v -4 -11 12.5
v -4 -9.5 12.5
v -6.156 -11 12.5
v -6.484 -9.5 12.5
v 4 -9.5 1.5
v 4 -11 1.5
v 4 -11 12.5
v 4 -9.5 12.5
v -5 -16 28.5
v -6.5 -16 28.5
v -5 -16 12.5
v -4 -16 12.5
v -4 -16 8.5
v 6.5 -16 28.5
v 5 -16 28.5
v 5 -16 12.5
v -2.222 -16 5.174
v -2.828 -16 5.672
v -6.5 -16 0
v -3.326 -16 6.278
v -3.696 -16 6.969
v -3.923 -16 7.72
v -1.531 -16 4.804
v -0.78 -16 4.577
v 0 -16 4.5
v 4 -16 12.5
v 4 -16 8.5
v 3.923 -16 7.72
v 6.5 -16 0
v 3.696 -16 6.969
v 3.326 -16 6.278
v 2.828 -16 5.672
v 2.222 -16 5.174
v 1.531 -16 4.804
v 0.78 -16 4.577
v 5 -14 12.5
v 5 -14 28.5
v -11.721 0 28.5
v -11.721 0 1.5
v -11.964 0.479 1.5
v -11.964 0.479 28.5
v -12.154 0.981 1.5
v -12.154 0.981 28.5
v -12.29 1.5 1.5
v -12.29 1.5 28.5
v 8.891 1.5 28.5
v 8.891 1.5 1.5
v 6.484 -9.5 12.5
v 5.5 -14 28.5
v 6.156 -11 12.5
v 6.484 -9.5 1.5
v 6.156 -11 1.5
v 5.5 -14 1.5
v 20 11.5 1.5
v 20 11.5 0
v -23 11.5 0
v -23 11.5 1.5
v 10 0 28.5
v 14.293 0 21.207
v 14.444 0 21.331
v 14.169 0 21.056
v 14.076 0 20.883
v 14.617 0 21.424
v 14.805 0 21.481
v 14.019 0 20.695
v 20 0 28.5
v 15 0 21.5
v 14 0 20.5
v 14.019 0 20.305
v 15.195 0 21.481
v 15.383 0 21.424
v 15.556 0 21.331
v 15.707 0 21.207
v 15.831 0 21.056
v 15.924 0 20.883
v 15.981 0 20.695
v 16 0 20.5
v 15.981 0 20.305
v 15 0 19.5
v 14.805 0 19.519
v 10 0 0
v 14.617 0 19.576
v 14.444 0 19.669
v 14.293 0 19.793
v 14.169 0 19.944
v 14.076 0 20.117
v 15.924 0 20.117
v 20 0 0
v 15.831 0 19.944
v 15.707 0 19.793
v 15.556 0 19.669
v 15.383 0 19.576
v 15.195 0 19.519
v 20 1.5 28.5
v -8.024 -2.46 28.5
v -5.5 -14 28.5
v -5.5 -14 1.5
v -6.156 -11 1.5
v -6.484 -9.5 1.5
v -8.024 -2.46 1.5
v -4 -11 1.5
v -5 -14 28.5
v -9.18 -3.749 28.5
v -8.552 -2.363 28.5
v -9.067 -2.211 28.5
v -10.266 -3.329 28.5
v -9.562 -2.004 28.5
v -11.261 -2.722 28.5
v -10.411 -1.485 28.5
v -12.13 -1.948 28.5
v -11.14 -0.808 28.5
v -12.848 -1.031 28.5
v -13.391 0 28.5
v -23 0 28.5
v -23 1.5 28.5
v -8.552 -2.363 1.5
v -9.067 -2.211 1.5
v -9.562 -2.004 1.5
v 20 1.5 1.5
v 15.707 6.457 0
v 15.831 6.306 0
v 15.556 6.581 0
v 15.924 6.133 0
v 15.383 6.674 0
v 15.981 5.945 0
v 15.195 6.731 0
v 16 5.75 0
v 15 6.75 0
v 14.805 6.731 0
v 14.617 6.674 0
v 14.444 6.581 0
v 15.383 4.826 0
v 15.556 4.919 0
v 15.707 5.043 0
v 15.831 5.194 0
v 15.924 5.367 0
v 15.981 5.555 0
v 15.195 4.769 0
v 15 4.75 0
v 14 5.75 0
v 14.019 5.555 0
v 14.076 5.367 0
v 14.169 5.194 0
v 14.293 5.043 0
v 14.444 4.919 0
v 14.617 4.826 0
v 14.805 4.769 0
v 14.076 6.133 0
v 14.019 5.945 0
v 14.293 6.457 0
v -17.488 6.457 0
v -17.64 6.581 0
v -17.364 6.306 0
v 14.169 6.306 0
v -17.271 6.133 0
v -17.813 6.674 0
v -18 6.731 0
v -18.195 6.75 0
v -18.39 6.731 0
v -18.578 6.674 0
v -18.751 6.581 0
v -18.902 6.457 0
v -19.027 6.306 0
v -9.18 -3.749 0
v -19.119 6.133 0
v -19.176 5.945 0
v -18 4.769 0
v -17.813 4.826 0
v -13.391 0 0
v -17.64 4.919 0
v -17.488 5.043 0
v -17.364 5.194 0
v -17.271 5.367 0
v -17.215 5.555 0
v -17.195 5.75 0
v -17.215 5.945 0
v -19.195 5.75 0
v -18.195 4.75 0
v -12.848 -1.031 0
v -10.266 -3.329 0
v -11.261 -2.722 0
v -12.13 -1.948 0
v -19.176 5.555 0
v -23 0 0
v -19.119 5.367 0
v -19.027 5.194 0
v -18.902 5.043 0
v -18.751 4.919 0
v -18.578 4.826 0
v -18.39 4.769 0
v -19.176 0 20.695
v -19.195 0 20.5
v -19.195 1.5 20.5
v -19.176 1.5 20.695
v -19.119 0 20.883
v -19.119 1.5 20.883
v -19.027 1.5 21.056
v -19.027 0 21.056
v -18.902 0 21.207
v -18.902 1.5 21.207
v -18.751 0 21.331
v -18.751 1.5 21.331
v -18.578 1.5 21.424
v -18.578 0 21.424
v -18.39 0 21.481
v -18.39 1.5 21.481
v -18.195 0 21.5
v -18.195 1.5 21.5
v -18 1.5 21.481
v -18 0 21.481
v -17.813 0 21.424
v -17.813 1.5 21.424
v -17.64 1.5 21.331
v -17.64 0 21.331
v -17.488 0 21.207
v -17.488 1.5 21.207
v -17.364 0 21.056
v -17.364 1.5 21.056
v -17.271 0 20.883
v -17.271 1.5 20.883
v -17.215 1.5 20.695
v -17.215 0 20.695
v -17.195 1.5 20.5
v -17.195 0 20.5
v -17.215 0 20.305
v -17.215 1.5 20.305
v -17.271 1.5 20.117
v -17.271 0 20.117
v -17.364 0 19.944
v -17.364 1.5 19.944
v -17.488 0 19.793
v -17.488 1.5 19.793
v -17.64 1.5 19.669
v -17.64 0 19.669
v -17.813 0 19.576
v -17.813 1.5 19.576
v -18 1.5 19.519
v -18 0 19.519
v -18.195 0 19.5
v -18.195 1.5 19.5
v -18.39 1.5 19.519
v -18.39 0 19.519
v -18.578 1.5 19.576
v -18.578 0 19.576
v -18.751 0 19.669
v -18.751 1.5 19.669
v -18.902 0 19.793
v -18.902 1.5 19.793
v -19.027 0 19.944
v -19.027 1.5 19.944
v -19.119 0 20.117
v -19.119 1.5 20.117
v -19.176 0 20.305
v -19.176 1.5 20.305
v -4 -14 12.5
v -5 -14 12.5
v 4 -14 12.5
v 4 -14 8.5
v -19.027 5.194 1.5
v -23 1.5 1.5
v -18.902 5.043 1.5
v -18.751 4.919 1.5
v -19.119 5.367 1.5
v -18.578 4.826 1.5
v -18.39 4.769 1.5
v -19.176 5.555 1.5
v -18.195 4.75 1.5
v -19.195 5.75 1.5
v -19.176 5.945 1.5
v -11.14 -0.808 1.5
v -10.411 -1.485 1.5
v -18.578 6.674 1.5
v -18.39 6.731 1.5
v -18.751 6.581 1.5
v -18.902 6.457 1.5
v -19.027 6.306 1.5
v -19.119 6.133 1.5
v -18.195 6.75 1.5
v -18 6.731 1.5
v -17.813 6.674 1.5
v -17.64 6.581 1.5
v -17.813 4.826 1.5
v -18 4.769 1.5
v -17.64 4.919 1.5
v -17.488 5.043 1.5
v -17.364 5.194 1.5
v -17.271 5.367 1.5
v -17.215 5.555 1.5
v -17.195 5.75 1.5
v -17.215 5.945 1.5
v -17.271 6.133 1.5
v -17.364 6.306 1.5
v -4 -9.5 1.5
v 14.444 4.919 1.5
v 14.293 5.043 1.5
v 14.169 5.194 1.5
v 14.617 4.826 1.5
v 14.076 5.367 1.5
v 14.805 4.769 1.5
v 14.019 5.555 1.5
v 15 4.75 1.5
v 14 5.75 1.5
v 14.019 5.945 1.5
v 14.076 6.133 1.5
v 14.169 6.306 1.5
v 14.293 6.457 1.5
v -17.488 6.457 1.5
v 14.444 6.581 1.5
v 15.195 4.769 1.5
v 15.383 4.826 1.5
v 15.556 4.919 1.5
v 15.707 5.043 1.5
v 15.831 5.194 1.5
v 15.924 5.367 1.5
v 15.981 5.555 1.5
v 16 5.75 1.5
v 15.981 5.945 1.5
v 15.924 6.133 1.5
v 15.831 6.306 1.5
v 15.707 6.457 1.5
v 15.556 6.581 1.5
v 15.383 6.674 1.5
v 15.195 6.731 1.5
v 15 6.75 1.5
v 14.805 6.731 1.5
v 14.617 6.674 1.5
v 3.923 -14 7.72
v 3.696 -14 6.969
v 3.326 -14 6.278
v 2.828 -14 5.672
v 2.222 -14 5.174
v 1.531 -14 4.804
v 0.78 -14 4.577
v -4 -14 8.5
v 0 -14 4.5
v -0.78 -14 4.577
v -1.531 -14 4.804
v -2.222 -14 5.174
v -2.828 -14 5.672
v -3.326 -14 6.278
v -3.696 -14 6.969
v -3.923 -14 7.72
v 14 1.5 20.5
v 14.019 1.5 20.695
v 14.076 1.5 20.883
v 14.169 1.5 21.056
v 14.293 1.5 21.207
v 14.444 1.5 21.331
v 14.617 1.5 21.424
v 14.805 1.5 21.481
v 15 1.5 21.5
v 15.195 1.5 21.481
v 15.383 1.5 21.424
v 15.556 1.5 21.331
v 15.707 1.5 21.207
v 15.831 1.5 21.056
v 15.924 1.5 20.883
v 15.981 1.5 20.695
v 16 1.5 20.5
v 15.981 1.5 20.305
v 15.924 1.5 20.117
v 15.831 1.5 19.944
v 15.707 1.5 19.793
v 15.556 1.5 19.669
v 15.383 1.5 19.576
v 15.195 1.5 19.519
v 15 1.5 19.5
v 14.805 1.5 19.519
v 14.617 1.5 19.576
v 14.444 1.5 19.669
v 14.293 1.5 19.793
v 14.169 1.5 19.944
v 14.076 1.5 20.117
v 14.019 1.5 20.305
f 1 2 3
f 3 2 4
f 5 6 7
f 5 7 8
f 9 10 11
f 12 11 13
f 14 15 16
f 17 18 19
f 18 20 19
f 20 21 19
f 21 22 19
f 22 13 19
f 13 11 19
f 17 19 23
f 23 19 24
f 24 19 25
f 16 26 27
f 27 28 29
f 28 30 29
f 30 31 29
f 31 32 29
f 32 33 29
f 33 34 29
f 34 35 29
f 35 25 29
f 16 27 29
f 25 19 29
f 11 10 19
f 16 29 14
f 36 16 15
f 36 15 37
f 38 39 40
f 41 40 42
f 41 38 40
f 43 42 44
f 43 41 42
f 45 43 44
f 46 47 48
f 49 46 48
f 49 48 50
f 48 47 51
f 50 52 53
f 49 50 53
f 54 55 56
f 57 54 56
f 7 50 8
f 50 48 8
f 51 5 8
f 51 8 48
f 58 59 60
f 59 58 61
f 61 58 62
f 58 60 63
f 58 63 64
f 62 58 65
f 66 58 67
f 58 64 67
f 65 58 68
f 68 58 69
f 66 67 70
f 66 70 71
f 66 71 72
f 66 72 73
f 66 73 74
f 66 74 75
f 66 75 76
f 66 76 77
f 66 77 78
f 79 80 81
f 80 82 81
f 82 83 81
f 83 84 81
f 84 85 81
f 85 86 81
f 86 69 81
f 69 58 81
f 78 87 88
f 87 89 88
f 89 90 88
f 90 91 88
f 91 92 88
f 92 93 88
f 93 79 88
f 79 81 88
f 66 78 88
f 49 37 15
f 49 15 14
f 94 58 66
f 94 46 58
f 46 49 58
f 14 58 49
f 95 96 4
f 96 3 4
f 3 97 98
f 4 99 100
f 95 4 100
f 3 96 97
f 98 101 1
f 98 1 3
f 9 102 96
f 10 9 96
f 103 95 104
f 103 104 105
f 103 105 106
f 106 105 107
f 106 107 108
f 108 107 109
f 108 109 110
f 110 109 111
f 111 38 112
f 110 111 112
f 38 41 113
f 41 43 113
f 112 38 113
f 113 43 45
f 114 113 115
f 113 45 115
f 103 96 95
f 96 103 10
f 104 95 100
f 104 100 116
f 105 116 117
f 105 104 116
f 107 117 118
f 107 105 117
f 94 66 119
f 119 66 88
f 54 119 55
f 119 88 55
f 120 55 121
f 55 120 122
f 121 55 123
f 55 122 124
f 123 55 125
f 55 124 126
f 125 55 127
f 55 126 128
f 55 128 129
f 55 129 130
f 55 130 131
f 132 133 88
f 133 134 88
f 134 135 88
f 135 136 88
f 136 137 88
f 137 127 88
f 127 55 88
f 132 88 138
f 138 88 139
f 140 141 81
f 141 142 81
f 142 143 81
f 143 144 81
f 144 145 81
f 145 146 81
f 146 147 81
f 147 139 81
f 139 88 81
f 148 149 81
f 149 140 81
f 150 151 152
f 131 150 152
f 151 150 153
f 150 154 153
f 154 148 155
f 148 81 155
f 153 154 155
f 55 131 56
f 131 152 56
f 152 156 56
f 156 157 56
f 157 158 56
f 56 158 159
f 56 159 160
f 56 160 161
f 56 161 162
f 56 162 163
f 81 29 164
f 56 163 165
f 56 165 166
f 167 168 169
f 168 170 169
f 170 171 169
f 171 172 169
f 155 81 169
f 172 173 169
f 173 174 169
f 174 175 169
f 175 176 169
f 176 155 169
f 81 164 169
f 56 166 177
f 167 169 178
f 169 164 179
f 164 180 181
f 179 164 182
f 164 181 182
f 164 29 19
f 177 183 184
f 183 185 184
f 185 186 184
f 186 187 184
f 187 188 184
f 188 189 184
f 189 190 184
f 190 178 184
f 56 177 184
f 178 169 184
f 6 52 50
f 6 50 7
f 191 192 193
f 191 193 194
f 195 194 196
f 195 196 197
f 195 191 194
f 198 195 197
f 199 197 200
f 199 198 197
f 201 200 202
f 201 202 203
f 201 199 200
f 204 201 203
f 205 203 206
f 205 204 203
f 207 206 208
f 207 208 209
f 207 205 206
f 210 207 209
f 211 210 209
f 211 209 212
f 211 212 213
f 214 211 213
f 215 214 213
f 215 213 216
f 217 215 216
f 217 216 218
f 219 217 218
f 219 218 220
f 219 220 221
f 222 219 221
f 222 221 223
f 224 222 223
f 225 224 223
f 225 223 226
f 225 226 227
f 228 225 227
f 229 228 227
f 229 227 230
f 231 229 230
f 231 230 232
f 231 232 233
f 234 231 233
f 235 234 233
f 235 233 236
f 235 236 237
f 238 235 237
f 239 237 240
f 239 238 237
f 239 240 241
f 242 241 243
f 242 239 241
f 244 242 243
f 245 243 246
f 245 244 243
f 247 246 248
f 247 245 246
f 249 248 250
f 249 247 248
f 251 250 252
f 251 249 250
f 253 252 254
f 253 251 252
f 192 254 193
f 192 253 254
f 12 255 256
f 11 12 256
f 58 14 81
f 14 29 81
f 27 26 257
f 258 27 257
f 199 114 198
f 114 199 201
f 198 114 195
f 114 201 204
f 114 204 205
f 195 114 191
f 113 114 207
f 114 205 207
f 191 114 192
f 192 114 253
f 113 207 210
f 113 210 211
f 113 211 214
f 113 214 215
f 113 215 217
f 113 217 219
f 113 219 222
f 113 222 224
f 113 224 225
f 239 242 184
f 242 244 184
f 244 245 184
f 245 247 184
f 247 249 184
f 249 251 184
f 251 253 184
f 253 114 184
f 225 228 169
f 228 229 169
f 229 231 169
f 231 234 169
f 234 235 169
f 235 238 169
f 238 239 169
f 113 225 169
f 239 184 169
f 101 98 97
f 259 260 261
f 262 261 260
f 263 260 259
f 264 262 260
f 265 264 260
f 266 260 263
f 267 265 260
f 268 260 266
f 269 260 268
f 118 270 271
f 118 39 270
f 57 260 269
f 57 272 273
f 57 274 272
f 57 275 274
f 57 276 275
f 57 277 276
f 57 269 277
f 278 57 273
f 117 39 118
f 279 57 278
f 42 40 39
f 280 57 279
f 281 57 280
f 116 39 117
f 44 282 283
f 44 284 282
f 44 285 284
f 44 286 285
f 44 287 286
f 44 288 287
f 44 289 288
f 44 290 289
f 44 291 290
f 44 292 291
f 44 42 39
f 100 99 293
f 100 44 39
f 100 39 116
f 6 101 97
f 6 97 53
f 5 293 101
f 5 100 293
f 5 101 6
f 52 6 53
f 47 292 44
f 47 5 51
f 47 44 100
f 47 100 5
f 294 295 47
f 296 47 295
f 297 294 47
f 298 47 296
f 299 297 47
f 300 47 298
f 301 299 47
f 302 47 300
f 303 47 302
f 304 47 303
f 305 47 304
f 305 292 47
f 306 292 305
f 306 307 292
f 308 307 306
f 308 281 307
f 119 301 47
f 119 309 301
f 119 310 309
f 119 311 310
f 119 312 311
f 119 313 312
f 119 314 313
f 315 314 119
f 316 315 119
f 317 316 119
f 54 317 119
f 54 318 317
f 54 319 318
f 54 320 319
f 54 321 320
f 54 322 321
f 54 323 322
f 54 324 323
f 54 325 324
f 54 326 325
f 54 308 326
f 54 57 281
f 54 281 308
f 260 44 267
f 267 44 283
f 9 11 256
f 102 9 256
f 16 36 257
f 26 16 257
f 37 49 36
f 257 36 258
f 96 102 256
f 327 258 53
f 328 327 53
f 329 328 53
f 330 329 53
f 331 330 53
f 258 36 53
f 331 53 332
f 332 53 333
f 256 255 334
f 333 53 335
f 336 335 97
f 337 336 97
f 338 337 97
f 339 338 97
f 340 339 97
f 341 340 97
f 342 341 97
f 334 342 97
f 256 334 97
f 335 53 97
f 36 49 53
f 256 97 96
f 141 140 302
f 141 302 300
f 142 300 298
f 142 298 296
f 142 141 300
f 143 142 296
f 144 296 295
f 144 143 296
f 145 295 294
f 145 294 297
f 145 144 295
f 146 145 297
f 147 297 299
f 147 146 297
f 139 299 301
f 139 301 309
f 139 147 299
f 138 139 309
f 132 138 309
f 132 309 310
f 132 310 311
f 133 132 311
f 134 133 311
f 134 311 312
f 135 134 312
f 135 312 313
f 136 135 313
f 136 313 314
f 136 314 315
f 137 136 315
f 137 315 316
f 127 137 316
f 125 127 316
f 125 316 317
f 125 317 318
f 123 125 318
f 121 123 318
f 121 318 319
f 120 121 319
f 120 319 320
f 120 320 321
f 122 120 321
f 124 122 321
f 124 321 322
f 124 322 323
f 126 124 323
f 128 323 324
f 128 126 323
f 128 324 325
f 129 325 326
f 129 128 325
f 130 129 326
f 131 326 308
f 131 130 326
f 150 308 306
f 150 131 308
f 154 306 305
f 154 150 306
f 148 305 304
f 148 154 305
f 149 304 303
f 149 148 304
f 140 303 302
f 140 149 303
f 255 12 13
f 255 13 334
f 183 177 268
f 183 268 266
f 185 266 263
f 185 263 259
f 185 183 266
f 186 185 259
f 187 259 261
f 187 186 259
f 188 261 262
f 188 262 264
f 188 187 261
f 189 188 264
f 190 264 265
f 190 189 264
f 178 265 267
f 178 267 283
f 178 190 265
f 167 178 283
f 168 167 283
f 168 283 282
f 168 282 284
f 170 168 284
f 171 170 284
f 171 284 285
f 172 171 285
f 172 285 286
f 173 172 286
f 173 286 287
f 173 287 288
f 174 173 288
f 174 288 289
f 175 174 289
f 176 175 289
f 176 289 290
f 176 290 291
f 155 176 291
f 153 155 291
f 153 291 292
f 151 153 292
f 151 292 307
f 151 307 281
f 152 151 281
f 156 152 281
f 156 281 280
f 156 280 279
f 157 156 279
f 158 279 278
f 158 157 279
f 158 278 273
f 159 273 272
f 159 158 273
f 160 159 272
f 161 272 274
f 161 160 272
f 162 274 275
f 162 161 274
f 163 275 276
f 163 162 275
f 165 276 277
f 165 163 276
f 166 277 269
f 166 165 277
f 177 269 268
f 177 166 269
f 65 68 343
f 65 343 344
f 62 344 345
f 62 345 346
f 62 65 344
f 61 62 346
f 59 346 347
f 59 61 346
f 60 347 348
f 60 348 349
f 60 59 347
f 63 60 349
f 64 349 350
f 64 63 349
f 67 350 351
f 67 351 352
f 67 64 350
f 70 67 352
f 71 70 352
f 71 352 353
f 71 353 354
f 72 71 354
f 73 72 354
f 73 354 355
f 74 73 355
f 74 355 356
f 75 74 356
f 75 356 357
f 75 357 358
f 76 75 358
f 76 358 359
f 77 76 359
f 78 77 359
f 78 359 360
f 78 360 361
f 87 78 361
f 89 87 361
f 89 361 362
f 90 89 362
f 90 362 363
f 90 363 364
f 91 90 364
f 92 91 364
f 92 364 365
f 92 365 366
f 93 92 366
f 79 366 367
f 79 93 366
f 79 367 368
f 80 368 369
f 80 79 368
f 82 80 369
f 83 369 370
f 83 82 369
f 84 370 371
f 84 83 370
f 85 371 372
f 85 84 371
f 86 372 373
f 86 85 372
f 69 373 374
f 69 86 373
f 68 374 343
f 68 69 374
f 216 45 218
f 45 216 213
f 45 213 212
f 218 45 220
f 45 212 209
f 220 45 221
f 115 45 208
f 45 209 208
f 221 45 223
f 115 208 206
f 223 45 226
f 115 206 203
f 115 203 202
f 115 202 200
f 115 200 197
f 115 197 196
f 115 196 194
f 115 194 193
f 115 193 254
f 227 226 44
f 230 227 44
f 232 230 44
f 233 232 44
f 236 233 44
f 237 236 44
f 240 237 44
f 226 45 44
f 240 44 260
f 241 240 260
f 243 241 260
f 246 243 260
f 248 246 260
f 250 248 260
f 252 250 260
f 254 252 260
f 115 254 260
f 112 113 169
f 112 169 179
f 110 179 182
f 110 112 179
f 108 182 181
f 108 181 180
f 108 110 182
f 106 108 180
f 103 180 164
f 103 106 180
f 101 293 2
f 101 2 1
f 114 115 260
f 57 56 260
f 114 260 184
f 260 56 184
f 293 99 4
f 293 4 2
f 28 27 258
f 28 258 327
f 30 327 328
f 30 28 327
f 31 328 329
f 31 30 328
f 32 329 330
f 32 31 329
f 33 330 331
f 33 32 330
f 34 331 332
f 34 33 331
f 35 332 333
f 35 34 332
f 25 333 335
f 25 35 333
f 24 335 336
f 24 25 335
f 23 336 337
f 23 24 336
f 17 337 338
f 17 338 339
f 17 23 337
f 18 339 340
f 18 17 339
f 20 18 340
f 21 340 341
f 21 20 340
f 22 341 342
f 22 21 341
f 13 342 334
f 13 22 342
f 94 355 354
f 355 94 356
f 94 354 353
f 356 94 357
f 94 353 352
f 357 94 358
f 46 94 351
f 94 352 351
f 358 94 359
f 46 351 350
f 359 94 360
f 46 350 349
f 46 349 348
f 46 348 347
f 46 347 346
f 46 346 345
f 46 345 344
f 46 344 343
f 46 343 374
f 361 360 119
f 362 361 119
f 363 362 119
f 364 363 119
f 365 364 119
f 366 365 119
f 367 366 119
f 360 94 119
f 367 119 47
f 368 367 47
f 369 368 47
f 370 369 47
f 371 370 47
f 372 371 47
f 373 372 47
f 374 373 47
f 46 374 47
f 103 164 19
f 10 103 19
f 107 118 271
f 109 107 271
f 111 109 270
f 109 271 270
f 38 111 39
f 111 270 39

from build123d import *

# Parameters (mm, degrees)
PAD_DEPTH       = 1.5
PAD001_DEPTH    = 27
PAD002_DEPTH    = 11
SKETCH003_W     = 10
SKETCH003_H     = 2
POCKET_DEPTH    = 16
SKETCH004_W     = 8
SKETCH004_H     = 2
POCKET001_DEPTH = 4
SKETCH005_R     = 4
POCKET002_DEPTH = 2
SKETCH006_R     = 5
POCKET003_DEPTH = 27
PAD003_DEPTH    = 27
PAD004_DEPTH    = 1.5
SKETCH009_R     = 1
POCKET004_DEPTH = 5
SKETCH010_R     = 1
POCKET005_DEPTH = 5


with BuildPart() as rearaxelfittingright:
    # Sketch → Pad (new body)
    with BuildSketch(Plane.XY):
        Polygon((-20, 11.5), (23, 11.5), (23, 0), (10, 0), (6.5, -16), (-6.5, -16), (-10, 0), (-20, 0), align=None)
    extrude(amount=PAD_DEPTH)

    # Sketch001 → Pad001 (new body)
    with BuildSketch(Plane.XY.offset(1.5)):
        Polygon((-20, 0), (-20, 1.5), (-8.890625, 1.5), (-5.5, -14), (5.5, -14), (8.890625, 1.5), (23, 1.5), (23, 0), (10, 0), (6.5, -16), (-6.5, -16), (-10, 0), align=None)
    extrude(amount=PAD001_DEPTH)

    # Sketch002 → Pad002 (new body)
    with BuildSketch(Plane.XY.offset(1.5)):
        Polygon((-6.15625, -11), (-4, -11), (-4, -9.5), (-6.484375, -9.5), align=None)
        Polygon((6.484375, -9.5), (4, -9.5), (4, -11), (6.15625, -11), align=None)
    extrude(amount=PAD002_DEPTH)

    # Sketch003 → Pocket (cut)
    with BuildSketch(Plane.XY.offset(28.5)):
        with Locations((0, -15)):
            Rectangle(SKETCH003_W, SKETCH003_H)
    extrude(amount=-POCKET_DEPTH, mode=Mode.SUBTRACT)

    # Sketch004 → Pocket001 (cut)
    with BuildSketch(Plane.XY.offset(12.5)):
        with Locations((0, -15)):
            Rectangle(SKETCH004_W, SKETCH004_H)
    extrude(amount=-POCKET001_DEPTH, mode=Mode.SUBTRACT)

    # Sketch005 → Pocket002 (cut)
    with BuildSketch(Plane.XZ.offset(16)):
        with Locations((0, 8.5)):
            Circle(SKETCH005_R)
    extrude(amount=-POCKET002_DEPTH, mode=Mode.SUBTRACT)

    # Sketch006 → Pocket003 (cut)
    with BuildSketch(Plane.XY.offset(28.5)):
        with Locations((7.390625, 2.5)):
            Circle(SKETCH006_R)
    extrude(amount=-POCKET003_DEPTH, mode=Mode.SUBTRACT)

    # Sketch007 → Pad003 (new body)
    with BuildSketch(Plane.XY.offset(1.5)):
        with BuildLine():
            ThreePointArc((9.179934789, -3.7488695361), (11.7128746974, -2.3547046824), (13.390625, 0))
            Line((11.7207520189, 0), (13.390625, 0))
            ThreePointArc((9.5616048305, -2.0040922033), (10.792123781, -1.1646699774), (11.7207520189, 0))
            Line((9.5616048305, -2.0040922033), (9.179934789, -3.7488695361))
        make_face()
    extrude(amount=PAD003_DEPTH)

    # Sketch008 → Pad004 (new body)
    with BuildSketch(Plane(origin=(0, 0, 1.5), x_dir=(1, 0, 0), z_dir=(0, 0, -1))):
        with BuildLine():
            ThreePointArc((13.390625, 0), (11.7128746974, 2.3547046824), (9.179934789, 3.7488695361))
            Line((9.179934789, 3.7488695361), (10, 0))
            Line((10, 0), (13.390625, 0))
        make_face()
    extrude(amount=PAD004_DEPTH)

    # Sketch009 → Pocket004 (cut)
    with BuildSketch(Plane.XZ):
        with Locations((-15, 20.5)):
            Circle(SKETCH009_R)
        with Locations((18.1953125, 20.5)):
            Circle(SKETCH009_R)
    extrude(amount=-POCKET004_DEPTH, mode=Mode.SUBTRACT)

    # Sketch010 → Pocket005 (cut)
    with BuildSketch(Plane(origin=(0, 0, 0), x_dir=(1, 0, 0), z_dir=(0, 0, -1))):
        with Locations((-15, -5.75)):
            Circle(SKETCH010_R)
        with Locations((18.1953125, -5.75)):
            Circle(SKETCH010_R)
    extrude(amount=-POCKET005_DEPTH, mode=Mode.SUBTRACT)


with BuildPart() as rearaxelfittingleft:
    # Part__Mirroring: instance of rearaxelfittingright
    add(rearaxelfittingright.part.mirror(Plane(origin=(0, 0, 0), x_dir=(0, -1, 0), z_dir=(1, 0, 0))))


solid = rearaxelfittingleft.part
